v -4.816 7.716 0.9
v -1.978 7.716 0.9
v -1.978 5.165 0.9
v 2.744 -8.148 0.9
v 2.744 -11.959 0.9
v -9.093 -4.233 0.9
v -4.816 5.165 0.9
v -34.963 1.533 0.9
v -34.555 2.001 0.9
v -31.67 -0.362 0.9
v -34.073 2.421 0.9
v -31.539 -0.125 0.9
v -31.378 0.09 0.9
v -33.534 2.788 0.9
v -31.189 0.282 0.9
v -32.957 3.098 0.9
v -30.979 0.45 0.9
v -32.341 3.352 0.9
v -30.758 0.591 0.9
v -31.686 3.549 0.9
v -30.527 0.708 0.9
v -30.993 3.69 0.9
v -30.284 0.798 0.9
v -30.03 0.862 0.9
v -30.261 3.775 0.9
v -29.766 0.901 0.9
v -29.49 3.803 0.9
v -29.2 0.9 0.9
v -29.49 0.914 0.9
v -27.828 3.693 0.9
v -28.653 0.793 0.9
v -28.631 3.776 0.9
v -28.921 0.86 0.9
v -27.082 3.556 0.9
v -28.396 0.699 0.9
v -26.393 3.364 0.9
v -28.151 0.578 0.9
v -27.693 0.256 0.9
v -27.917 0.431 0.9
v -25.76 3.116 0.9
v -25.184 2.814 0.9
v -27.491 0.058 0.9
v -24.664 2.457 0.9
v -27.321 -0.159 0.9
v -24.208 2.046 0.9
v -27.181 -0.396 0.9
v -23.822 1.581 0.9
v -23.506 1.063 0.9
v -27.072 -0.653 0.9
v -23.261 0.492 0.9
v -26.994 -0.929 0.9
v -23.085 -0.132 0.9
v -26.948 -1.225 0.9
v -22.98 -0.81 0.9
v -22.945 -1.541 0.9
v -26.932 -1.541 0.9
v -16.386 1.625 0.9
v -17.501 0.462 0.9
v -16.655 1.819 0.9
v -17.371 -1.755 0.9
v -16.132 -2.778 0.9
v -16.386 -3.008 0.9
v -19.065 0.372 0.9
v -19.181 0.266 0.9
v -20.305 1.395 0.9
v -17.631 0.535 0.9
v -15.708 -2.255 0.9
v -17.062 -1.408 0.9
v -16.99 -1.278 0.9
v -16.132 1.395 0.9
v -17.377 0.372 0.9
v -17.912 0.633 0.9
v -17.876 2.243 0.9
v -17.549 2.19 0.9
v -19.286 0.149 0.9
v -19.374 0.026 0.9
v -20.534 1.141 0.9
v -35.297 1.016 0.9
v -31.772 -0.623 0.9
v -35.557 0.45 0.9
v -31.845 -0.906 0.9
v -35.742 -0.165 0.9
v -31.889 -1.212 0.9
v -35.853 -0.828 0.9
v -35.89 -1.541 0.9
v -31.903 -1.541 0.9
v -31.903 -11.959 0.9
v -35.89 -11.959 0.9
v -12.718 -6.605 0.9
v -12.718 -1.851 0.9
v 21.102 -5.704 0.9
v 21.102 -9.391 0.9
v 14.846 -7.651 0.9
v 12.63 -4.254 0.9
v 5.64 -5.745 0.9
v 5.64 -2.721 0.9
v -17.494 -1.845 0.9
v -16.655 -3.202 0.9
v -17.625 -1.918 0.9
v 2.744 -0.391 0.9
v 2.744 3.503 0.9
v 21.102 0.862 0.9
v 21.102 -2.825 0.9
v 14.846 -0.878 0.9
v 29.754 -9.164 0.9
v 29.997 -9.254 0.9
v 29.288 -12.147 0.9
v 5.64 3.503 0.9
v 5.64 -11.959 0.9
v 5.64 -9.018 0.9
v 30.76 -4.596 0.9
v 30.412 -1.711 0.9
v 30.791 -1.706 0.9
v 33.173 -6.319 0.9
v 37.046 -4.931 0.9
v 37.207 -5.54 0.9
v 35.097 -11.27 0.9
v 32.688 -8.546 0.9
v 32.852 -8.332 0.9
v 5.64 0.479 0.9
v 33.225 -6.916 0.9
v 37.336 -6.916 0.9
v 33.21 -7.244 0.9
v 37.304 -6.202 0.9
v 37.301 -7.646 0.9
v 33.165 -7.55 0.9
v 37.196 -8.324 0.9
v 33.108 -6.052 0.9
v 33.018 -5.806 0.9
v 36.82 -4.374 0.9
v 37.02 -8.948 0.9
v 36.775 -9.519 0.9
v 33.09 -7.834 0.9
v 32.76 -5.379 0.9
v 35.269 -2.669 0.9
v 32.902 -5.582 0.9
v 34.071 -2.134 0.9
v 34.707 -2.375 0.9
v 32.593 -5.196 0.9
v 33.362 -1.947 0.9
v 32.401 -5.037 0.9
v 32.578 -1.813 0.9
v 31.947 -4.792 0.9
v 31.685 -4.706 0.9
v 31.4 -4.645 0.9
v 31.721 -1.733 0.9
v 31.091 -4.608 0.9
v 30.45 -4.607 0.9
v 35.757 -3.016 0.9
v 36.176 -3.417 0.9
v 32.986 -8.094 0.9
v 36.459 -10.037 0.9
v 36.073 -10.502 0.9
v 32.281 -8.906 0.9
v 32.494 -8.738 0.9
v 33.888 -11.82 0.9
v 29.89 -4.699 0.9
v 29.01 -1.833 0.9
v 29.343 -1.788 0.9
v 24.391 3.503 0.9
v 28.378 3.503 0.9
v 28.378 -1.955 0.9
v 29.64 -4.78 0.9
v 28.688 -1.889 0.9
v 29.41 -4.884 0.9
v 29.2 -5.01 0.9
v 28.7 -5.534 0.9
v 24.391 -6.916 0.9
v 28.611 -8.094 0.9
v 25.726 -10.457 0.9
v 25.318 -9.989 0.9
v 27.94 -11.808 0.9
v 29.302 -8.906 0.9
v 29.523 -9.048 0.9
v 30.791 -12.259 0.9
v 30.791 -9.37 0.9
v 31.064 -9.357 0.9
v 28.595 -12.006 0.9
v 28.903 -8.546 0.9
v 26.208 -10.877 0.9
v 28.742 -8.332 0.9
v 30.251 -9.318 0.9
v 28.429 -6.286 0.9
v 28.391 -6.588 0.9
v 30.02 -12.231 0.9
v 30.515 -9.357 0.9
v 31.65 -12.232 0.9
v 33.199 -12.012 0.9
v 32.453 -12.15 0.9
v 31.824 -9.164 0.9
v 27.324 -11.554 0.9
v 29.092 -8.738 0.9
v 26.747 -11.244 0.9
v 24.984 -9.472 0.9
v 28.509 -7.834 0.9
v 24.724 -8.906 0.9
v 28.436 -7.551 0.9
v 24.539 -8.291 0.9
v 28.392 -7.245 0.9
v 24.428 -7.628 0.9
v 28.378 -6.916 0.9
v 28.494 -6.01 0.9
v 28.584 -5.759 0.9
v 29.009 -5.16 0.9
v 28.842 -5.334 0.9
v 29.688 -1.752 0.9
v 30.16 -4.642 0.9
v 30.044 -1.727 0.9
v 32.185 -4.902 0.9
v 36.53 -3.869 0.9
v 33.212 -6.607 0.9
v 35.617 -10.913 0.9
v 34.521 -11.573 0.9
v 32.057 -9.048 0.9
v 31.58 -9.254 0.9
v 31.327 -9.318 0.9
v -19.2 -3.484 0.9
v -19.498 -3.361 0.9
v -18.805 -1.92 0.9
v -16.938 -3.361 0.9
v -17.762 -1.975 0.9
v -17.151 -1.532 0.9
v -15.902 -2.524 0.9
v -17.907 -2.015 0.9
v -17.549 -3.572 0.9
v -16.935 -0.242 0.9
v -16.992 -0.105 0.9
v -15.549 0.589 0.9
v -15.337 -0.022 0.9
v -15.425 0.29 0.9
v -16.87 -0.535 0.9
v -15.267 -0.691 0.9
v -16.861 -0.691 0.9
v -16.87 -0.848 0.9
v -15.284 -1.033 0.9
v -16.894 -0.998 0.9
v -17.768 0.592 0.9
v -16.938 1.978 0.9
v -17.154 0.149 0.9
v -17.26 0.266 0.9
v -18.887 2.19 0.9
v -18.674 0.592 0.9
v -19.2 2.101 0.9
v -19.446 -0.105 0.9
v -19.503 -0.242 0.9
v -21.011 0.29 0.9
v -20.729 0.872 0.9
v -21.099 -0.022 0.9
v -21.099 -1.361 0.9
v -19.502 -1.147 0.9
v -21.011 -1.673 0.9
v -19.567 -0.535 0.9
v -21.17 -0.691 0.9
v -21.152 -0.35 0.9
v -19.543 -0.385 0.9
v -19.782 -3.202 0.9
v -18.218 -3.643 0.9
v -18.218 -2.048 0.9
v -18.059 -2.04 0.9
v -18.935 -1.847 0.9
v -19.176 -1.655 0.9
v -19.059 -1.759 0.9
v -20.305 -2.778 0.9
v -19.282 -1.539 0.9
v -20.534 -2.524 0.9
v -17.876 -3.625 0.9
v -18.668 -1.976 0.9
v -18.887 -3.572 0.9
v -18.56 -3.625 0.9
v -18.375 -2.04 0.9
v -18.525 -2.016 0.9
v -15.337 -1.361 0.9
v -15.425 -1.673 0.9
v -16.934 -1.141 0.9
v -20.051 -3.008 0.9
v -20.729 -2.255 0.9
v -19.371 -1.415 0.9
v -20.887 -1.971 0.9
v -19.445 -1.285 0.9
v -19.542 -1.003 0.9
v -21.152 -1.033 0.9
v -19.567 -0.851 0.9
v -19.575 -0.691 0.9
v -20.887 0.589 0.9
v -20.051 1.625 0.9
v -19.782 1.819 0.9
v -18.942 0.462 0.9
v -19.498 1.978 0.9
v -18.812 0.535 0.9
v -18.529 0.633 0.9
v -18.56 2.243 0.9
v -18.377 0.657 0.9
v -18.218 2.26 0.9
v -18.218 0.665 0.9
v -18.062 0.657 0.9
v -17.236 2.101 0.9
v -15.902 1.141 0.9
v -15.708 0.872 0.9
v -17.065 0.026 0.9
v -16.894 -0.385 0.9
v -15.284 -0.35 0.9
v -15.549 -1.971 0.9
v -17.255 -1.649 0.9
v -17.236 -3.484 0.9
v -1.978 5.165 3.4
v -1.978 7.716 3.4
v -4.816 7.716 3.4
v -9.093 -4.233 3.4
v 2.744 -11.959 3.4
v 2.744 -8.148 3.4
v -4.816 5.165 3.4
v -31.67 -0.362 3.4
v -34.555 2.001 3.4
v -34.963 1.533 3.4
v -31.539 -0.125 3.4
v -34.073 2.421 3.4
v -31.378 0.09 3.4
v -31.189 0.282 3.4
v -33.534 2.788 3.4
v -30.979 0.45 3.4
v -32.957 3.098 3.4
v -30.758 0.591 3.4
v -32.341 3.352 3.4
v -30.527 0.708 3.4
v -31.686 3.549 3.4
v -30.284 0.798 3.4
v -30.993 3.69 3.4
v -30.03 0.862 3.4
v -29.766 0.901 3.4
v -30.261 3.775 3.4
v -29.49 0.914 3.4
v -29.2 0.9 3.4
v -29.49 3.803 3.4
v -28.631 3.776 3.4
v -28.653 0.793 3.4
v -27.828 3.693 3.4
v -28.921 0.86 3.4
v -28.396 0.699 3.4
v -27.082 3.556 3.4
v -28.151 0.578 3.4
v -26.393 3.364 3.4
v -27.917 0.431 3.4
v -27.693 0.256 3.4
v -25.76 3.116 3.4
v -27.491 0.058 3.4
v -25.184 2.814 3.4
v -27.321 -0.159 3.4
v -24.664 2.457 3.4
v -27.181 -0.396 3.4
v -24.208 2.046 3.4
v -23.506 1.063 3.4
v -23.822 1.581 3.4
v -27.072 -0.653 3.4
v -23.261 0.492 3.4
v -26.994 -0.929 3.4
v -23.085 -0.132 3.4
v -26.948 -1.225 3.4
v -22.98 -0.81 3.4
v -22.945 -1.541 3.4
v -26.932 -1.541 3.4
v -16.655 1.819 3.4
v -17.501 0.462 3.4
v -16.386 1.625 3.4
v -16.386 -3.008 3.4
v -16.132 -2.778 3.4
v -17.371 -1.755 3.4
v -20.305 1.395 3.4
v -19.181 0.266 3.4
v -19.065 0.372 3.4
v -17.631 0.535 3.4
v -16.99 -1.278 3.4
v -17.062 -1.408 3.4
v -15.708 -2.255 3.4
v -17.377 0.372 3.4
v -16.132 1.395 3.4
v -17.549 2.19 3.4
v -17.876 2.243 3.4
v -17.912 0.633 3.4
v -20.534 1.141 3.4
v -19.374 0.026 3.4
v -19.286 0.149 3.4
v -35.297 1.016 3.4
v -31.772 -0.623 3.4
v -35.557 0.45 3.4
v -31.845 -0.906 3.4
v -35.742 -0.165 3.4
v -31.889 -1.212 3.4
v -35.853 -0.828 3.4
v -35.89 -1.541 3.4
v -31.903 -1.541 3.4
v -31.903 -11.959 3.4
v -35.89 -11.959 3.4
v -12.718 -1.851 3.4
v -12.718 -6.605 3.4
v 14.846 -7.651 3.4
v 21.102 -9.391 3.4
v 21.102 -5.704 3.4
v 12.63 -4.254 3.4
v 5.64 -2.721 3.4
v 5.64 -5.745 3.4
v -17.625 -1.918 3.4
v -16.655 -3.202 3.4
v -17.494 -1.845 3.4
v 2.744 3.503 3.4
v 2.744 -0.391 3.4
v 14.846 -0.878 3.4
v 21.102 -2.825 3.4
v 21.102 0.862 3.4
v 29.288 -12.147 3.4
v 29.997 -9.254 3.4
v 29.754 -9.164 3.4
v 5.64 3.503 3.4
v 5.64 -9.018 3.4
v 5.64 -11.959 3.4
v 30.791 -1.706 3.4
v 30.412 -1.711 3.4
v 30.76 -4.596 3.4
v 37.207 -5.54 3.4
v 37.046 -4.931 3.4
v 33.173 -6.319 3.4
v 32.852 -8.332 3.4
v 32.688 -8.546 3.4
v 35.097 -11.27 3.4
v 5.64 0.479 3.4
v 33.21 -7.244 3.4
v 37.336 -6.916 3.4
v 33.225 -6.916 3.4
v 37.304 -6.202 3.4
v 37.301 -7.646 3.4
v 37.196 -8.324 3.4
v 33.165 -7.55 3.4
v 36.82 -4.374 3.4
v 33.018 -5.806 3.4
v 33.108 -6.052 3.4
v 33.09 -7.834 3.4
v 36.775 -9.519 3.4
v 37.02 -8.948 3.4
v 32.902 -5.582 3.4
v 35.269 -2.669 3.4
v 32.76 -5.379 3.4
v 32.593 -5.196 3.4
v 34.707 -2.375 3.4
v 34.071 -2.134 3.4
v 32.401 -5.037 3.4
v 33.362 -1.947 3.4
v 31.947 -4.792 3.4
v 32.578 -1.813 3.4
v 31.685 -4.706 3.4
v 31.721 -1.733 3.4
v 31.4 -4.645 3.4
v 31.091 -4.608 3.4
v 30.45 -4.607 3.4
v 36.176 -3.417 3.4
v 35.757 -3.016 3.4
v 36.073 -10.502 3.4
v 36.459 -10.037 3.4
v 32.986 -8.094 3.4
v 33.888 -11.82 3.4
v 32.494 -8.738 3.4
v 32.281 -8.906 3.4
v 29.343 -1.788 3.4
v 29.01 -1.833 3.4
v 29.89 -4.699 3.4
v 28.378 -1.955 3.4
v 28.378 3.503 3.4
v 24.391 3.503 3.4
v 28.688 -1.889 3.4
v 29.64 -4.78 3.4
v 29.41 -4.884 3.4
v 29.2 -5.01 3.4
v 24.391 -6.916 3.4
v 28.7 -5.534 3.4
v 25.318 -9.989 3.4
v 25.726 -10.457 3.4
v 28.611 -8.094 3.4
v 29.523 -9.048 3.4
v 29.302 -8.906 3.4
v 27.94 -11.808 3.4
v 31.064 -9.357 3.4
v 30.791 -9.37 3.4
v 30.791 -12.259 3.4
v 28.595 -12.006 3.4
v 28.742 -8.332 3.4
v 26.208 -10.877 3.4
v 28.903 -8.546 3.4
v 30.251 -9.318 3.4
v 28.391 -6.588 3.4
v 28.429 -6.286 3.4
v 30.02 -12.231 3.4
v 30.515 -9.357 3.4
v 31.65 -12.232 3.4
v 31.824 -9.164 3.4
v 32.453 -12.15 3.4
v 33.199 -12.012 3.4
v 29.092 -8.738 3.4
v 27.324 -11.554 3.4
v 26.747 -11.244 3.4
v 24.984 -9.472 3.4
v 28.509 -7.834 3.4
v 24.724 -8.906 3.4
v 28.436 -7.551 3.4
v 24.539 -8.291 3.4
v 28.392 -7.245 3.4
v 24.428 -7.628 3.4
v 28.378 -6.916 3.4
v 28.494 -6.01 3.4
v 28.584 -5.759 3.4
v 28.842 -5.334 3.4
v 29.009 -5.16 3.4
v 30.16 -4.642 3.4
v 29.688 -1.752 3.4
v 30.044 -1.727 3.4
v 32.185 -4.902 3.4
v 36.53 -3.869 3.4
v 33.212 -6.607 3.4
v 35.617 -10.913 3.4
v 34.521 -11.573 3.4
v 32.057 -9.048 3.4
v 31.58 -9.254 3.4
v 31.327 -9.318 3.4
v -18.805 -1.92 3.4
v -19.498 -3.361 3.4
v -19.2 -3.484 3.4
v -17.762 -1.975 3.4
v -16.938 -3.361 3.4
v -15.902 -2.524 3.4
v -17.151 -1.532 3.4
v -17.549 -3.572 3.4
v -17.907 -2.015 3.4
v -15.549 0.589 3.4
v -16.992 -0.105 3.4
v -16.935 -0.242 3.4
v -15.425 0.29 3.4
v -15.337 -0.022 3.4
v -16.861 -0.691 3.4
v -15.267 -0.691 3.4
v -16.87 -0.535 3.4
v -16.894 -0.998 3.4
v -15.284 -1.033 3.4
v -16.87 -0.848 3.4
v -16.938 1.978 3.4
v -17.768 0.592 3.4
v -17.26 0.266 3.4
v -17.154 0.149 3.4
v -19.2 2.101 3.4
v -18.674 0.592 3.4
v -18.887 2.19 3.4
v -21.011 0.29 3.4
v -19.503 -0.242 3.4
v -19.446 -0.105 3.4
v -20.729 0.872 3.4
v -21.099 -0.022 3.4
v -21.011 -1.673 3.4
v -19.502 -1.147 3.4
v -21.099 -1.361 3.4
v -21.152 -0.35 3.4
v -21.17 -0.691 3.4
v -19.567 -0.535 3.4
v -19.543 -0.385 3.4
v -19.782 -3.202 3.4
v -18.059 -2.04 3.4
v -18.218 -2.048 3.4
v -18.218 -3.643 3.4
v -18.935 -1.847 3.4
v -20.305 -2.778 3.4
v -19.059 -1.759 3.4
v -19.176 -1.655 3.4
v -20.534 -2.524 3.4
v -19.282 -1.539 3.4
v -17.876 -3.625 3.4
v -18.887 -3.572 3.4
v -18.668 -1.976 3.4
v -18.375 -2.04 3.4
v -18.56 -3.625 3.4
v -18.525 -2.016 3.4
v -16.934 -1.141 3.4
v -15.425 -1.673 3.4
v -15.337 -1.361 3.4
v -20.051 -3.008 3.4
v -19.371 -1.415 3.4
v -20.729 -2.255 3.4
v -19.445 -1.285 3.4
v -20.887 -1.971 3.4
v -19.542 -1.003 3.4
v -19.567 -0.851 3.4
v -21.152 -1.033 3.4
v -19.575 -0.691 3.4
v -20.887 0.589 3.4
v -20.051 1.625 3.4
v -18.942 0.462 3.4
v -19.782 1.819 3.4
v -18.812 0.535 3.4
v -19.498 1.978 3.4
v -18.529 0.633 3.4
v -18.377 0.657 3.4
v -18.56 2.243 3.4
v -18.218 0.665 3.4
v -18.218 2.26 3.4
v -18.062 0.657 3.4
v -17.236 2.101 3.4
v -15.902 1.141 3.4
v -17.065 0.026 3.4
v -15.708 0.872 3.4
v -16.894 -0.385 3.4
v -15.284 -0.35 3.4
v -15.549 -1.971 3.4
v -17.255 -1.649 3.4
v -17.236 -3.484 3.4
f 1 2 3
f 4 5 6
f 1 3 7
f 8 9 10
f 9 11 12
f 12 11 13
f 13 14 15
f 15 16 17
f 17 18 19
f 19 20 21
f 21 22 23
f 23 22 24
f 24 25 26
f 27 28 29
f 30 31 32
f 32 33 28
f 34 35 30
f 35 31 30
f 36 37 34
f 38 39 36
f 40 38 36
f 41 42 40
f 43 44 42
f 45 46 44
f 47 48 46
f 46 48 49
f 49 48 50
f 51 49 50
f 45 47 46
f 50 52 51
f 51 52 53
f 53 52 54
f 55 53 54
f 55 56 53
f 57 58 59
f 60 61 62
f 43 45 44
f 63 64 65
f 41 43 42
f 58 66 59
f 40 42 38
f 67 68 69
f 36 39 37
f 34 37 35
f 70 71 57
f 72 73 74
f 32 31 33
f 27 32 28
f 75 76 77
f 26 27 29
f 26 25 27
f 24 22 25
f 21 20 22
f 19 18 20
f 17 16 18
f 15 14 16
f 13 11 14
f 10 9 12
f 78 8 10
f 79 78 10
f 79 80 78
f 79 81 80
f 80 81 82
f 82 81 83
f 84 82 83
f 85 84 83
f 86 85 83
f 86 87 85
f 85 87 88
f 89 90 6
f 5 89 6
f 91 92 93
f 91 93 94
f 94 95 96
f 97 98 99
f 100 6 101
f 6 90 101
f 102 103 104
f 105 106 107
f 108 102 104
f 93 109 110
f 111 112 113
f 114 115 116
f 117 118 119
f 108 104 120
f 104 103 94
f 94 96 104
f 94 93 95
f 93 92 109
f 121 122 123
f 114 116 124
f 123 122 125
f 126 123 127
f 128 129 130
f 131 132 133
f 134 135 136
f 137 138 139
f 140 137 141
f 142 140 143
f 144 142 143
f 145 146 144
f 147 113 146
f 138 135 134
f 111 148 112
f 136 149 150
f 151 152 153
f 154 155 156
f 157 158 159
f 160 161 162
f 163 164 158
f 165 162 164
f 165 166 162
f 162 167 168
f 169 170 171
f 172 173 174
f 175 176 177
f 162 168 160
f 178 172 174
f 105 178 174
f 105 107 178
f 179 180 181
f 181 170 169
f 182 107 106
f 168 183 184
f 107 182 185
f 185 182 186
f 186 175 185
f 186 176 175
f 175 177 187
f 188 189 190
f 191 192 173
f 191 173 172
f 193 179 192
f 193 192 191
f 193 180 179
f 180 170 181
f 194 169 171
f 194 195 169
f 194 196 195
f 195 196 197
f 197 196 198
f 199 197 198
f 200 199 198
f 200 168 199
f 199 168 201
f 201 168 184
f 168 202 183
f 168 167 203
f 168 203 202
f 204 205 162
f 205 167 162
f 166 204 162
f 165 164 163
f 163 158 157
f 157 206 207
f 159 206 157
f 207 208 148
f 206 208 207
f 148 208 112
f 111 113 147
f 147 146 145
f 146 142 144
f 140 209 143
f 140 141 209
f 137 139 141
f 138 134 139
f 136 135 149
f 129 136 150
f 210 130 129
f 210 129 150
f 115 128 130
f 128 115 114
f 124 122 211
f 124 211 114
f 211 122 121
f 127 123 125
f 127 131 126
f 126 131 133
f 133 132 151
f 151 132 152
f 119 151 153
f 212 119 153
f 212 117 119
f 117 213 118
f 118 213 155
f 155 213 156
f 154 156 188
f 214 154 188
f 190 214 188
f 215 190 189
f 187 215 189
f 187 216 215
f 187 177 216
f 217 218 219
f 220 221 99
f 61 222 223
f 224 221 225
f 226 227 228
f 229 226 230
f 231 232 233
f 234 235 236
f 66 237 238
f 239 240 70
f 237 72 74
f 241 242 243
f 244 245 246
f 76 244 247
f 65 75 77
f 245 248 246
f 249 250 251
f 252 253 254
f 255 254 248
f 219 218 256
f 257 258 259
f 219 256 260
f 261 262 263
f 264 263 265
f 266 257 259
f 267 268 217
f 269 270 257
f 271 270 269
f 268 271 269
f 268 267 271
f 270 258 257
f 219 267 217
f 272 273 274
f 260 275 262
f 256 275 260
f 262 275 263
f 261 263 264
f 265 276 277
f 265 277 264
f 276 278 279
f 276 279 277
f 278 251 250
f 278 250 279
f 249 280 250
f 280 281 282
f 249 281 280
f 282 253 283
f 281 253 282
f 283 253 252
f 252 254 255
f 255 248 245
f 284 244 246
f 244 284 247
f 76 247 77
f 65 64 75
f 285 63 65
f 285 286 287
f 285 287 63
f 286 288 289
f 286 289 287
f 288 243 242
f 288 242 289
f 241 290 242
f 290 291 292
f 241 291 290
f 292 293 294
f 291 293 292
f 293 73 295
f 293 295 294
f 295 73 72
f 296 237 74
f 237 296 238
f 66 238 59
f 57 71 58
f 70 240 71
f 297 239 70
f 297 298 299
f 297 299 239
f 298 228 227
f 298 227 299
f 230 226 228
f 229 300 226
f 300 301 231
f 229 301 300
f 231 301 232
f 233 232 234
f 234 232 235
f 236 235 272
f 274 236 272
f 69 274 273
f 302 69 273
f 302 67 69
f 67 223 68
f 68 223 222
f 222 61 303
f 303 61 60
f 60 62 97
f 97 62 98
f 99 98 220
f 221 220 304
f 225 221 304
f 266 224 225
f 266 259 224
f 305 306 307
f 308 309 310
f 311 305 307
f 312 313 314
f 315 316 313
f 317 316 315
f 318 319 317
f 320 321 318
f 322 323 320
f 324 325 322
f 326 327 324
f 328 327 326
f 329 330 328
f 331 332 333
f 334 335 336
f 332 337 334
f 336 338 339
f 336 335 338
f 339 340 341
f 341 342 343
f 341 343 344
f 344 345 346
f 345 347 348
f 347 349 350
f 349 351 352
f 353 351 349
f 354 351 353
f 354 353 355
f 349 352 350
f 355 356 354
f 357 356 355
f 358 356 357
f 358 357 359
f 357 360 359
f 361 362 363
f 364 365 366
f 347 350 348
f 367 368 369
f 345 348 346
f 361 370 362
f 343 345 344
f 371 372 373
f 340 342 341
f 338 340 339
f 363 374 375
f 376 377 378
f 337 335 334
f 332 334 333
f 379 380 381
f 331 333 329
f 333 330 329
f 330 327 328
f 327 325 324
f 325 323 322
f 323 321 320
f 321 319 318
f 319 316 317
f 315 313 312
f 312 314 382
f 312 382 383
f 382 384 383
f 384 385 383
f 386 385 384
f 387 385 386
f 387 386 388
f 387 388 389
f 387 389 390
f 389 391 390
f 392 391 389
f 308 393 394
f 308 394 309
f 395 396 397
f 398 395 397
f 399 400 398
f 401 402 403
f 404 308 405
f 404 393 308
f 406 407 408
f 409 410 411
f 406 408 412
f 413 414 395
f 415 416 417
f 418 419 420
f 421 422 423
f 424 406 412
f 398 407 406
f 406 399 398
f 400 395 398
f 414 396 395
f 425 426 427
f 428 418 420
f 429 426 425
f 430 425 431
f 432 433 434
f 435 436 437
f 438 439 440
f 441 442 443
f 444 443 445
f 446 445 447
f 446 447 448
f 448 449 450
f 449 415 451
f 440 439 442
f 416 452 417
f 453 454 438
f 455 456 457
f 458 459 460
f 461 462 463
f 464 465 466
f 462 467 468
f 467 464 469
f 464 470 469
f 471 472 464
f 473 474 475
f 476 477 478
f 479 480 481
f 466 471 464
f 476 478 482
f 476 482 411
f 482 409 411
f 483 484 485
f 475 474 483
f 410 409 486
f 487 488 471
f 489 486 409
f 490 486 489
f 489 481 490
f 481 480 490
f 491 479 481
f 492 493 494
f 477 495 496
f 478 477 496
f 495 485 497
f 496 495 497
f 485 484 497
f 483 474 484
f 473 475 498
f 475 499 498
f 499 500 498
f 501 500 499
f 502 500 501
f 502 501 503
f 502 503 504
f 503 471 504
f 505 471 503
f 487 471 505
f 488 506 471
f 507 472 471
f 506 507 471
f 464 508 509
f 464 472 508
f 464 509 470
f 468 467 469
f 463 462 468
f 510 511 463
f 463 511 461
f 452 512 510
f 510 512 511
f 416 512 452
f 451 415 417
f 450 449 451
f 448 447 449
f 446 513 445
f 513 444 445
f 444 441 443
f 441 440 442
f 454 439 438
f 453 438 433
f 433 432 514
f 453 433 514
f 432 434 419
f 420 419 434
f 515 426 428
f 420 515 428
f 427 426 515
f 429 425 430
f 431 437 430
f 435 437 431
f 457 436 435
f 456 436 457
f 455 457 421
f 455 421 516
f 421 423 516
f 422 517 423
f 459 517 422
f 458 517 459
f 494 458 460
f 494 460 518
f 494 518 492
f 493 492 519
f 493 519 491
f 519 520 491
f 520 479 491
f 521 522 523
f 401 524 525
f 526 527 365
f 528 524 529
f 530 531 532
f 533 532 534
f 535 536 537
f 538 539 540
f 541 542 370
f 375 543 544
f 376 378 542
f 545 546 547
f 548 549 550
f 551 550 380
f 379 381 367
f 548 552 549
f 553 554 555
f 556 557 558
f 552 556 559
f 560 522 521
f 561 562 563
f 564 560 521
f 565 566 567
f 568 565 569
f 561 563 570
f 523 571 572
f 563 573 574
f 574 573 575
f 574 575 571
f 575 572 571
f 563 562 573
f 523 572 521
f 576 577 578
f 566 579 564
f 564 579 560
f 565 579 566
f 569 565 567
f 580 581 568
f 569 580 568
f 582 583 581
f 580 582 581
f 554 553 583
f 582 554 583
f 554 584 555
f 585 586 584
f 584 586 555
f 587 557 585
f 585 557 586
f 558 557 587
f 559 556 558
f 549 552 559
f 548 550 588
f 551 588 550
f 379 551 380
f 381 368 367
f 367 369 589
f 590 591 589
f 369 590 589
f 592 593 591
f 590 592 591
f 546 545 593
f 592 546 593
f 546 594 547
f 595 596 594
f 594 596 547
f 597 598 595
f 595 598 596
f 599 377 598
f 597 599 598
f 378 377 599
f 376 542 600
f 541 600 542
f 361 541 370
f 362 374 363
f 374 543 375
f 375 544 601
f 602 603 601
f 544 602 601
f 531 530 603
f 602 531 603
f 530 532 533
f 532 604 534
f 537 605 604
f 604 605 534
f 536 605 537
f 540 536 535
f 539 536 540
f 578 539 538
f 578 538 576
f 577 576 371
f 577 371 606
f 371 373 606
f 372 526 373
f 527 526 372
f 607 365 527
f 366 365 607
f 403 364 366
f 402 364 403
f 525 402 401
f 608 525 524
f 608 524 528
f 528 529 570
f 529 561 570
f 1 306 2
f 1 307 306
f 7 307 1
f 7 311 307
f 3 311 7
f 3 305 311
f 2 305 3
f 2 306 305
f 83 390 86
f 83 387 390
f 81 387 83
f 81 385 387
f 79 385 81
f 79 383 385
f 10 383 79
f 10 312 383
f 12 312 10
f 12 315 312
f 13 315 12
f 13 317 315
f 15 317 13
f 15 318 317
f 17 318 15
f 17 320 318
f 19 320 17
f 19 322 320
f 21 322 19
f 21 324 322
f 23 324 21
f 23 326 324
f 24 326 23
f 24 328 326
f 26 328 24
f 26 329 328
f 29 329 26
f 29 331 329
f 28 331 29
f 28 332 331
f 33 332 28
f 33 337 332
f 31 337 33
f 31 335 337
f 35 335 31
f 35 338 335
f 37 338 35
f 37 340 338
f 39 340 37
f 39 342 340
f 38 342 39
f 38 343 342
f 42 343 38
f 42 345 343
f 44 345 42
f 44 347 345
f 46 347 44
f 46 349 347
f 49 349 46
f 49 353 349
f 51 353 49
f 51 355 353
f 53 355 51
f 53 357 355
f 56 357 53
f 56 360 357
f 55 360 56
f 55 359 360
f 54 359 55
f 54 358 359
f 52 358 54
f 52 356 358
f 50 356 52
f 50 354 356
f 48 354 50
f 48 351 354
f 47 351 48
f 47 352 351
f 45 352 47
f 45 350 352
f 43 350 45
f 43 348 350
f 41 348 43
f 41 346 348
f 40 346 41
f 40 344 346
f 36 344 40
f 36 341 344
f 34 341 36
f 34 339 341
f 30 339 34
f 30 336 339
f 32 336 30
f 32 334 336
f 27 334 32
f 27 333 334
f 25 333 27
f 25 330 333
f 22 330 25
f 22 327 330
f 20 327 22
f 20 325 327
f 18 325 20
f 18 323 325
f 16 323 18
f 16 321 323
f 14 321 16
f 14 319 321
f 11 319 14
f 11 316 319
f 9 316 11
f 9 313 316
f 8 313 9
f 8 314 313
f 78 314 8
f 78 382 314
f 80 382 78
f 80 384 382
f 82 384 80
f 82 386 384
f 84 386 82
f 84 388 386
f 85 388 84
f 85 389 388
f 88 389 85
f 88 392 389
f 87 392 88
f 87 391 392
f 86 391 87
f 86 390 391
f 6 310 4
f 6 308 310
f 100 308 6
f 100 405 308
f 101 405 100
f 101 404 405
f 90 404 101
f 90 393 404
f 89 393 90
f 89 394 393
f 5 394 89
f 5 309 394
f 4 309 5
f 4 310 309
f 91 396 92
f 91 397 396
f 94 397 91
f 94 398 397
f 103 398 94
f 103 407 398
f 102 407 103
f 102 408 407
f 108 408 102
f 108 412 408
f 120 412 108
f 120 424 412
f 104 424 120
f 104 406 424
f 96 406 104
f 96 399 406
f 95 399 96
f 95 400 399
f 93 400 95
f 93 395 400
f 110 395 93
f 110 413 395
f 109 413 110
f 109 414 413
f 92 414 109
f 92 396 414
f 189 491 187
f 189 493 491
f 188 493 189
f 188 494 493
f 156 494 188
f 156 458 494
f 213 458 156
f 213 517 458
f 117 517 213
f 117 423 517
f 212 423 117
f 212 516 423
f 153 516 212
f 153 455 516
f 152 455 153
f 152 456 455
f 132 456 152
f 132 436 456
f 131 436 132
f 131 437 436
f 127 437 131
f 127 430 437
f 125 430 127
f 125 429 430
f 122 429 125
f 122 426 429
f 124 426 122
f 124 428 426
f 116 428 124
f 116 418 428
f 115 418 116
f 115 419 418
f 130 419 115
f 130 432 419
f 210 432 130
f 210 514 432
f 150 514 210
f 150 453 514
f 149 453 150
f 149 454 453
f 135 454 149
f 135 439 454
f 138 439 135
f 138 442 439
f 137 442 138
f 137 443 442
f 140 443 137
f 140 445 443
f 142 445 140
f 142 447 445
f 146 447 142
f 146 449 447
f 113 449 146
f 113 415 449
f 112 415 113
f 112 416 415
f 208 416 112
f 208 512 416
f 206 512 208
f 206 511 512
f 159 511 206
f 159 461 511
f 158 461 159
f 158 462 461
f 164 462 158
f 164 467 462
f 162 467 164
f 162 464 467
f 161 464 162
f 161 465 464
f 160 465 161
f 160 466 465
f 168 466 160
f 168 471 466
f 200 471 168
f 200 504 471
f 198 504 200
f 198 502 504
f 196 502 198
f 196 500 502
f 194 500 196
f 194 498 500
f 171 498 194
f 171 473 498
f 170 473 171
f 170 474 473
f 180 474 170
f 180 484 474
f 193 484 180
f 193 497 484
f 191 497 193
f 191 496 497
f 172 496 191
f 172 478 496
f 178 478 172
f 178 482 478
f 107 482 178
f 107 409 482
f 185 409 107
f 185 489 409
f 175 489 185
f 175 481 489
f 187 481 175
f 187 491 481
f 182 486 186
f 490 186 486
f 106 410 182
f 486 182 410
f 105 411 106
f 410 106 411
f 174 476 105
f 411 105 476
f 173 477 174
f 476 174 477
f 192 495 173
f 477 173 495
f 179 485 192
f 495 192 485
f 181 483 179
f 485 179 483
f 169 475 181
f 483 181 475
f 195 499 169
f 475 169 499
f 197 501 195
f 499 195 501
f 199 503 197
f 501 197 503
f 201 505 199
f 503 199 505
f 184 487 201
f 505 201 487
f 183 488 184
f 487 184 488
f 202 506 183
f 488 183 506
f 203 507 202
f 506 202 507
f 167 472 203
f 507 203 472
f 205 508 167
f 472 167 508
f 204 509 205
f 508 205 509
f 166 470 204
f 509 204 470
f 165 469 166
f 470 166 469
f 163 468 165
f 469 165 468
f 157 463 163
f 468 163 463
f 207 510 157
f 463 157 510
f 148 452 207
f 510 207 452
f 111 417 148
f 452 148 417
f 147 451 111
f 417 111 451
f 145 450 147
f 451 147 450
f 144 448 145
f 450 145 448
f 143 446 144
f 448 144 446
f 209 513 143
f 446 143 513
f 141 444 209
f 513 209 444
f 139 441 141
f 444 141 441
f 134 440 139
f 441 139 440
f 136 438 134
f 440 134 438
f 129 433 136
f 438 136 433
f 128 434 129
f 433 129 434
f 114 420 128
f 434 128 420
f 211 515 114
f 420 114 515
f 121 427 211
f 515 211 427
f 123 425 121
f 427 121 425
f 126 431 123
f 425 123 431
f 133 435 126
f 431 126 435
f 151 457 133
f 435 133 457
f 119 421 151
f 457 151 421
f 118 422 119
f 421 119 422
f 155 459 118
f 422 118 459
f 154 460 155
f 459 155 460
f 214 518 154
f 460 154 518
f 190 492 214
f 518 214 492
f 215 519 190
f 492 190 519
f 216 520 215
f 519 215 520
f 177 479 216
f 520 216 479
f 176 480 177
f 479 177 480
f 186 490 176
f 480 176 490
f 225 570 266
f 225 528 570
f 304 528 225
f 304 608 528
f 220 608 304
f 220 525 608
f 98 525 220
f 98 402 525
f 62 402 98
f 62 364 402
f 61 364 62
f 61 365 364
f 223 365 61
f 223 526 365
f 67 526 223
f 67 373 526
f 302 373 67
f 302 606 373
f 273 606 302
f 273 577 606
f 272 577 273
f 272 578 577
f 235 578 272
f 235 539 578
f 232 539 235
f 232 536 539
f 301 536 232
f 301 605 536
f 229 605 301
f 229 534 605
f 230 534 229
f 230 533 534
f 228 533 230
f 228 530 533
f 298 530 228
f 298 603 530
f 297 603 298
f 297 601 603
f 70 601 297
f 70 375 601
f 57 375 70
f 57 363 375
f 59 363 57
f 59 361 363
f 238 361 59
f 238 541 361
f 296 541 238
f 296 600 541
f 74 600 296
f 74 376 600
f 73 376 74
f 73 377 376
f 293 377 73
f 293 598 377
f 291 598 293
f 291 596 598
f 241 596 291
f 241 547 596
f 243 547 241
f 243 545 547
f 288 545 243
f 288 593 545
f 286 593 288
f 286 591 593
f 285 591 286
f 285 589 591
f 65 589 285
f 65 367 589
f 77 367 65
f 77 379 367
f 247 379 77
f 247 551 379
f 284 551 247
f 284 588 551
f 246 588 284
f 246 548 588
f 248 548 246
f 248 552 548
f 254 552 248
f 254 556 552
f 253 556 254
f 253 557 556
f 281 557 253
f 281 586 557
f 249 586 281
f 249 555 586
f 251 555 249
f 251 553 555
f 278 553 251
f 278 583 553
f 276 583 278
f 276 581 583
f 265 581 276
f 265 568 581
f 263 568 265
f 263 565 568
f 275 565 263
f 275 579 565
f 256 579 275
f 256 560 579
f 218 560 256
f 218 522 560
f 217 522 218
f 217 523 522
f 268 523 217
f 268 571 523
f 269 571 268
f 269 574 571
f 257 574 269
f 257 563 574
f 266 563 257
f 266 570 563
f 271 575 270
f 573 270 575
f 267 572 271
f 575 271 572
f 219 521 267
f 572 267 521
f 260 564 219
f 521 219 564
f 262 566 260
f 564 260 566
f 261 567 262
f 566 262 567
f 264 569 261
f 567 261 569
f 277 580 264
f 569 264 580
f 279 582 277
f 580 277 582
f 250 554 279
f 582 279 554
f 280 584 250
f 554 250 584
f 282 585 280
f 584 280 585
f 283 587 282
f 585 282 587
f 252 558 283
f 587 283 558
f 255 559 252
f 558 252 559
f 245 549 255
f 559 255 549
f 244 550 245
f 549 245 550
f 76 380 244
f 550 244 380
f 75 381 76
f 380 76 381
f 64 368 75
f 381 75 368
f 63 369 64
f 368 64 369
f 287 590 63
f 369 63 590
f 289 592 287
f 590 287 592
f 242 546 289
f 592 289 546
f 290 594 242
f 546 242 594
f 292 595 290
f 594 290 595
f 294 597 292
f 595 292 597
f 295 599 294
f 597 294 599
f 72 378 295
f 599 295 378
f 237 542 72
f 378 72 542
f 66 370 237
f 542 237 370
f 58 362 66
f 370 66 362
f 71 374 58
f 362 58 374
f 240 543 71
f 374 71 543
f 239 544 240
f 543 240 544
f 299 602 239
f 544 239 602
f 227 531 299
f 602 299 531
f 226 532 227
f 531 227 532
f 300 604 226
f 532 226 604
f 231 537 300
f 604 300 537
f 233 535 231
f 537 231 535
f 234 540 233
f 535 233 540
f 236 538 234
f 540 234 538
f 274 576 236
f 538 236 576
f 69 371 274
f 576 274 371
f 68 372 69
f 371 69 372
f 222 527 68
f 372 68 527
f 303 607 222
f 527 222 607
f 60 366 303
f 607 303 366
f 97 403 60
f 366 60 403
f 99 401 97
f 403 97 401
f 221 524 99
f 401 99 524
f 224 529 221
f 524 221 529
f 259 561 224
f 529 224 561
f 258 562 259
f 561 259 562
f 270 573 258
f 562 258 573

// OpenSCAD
$fn = 48;
  // syllabics (overlaid on icon, tallest)
  translate([0, -2.500, 0.900]) linear_extrude(height=2.500) text("ᒋᐤᐹᕒᑲ", size=15.272, halign="center", valign="center", font="Euphemia UCAS:style=Bold");
